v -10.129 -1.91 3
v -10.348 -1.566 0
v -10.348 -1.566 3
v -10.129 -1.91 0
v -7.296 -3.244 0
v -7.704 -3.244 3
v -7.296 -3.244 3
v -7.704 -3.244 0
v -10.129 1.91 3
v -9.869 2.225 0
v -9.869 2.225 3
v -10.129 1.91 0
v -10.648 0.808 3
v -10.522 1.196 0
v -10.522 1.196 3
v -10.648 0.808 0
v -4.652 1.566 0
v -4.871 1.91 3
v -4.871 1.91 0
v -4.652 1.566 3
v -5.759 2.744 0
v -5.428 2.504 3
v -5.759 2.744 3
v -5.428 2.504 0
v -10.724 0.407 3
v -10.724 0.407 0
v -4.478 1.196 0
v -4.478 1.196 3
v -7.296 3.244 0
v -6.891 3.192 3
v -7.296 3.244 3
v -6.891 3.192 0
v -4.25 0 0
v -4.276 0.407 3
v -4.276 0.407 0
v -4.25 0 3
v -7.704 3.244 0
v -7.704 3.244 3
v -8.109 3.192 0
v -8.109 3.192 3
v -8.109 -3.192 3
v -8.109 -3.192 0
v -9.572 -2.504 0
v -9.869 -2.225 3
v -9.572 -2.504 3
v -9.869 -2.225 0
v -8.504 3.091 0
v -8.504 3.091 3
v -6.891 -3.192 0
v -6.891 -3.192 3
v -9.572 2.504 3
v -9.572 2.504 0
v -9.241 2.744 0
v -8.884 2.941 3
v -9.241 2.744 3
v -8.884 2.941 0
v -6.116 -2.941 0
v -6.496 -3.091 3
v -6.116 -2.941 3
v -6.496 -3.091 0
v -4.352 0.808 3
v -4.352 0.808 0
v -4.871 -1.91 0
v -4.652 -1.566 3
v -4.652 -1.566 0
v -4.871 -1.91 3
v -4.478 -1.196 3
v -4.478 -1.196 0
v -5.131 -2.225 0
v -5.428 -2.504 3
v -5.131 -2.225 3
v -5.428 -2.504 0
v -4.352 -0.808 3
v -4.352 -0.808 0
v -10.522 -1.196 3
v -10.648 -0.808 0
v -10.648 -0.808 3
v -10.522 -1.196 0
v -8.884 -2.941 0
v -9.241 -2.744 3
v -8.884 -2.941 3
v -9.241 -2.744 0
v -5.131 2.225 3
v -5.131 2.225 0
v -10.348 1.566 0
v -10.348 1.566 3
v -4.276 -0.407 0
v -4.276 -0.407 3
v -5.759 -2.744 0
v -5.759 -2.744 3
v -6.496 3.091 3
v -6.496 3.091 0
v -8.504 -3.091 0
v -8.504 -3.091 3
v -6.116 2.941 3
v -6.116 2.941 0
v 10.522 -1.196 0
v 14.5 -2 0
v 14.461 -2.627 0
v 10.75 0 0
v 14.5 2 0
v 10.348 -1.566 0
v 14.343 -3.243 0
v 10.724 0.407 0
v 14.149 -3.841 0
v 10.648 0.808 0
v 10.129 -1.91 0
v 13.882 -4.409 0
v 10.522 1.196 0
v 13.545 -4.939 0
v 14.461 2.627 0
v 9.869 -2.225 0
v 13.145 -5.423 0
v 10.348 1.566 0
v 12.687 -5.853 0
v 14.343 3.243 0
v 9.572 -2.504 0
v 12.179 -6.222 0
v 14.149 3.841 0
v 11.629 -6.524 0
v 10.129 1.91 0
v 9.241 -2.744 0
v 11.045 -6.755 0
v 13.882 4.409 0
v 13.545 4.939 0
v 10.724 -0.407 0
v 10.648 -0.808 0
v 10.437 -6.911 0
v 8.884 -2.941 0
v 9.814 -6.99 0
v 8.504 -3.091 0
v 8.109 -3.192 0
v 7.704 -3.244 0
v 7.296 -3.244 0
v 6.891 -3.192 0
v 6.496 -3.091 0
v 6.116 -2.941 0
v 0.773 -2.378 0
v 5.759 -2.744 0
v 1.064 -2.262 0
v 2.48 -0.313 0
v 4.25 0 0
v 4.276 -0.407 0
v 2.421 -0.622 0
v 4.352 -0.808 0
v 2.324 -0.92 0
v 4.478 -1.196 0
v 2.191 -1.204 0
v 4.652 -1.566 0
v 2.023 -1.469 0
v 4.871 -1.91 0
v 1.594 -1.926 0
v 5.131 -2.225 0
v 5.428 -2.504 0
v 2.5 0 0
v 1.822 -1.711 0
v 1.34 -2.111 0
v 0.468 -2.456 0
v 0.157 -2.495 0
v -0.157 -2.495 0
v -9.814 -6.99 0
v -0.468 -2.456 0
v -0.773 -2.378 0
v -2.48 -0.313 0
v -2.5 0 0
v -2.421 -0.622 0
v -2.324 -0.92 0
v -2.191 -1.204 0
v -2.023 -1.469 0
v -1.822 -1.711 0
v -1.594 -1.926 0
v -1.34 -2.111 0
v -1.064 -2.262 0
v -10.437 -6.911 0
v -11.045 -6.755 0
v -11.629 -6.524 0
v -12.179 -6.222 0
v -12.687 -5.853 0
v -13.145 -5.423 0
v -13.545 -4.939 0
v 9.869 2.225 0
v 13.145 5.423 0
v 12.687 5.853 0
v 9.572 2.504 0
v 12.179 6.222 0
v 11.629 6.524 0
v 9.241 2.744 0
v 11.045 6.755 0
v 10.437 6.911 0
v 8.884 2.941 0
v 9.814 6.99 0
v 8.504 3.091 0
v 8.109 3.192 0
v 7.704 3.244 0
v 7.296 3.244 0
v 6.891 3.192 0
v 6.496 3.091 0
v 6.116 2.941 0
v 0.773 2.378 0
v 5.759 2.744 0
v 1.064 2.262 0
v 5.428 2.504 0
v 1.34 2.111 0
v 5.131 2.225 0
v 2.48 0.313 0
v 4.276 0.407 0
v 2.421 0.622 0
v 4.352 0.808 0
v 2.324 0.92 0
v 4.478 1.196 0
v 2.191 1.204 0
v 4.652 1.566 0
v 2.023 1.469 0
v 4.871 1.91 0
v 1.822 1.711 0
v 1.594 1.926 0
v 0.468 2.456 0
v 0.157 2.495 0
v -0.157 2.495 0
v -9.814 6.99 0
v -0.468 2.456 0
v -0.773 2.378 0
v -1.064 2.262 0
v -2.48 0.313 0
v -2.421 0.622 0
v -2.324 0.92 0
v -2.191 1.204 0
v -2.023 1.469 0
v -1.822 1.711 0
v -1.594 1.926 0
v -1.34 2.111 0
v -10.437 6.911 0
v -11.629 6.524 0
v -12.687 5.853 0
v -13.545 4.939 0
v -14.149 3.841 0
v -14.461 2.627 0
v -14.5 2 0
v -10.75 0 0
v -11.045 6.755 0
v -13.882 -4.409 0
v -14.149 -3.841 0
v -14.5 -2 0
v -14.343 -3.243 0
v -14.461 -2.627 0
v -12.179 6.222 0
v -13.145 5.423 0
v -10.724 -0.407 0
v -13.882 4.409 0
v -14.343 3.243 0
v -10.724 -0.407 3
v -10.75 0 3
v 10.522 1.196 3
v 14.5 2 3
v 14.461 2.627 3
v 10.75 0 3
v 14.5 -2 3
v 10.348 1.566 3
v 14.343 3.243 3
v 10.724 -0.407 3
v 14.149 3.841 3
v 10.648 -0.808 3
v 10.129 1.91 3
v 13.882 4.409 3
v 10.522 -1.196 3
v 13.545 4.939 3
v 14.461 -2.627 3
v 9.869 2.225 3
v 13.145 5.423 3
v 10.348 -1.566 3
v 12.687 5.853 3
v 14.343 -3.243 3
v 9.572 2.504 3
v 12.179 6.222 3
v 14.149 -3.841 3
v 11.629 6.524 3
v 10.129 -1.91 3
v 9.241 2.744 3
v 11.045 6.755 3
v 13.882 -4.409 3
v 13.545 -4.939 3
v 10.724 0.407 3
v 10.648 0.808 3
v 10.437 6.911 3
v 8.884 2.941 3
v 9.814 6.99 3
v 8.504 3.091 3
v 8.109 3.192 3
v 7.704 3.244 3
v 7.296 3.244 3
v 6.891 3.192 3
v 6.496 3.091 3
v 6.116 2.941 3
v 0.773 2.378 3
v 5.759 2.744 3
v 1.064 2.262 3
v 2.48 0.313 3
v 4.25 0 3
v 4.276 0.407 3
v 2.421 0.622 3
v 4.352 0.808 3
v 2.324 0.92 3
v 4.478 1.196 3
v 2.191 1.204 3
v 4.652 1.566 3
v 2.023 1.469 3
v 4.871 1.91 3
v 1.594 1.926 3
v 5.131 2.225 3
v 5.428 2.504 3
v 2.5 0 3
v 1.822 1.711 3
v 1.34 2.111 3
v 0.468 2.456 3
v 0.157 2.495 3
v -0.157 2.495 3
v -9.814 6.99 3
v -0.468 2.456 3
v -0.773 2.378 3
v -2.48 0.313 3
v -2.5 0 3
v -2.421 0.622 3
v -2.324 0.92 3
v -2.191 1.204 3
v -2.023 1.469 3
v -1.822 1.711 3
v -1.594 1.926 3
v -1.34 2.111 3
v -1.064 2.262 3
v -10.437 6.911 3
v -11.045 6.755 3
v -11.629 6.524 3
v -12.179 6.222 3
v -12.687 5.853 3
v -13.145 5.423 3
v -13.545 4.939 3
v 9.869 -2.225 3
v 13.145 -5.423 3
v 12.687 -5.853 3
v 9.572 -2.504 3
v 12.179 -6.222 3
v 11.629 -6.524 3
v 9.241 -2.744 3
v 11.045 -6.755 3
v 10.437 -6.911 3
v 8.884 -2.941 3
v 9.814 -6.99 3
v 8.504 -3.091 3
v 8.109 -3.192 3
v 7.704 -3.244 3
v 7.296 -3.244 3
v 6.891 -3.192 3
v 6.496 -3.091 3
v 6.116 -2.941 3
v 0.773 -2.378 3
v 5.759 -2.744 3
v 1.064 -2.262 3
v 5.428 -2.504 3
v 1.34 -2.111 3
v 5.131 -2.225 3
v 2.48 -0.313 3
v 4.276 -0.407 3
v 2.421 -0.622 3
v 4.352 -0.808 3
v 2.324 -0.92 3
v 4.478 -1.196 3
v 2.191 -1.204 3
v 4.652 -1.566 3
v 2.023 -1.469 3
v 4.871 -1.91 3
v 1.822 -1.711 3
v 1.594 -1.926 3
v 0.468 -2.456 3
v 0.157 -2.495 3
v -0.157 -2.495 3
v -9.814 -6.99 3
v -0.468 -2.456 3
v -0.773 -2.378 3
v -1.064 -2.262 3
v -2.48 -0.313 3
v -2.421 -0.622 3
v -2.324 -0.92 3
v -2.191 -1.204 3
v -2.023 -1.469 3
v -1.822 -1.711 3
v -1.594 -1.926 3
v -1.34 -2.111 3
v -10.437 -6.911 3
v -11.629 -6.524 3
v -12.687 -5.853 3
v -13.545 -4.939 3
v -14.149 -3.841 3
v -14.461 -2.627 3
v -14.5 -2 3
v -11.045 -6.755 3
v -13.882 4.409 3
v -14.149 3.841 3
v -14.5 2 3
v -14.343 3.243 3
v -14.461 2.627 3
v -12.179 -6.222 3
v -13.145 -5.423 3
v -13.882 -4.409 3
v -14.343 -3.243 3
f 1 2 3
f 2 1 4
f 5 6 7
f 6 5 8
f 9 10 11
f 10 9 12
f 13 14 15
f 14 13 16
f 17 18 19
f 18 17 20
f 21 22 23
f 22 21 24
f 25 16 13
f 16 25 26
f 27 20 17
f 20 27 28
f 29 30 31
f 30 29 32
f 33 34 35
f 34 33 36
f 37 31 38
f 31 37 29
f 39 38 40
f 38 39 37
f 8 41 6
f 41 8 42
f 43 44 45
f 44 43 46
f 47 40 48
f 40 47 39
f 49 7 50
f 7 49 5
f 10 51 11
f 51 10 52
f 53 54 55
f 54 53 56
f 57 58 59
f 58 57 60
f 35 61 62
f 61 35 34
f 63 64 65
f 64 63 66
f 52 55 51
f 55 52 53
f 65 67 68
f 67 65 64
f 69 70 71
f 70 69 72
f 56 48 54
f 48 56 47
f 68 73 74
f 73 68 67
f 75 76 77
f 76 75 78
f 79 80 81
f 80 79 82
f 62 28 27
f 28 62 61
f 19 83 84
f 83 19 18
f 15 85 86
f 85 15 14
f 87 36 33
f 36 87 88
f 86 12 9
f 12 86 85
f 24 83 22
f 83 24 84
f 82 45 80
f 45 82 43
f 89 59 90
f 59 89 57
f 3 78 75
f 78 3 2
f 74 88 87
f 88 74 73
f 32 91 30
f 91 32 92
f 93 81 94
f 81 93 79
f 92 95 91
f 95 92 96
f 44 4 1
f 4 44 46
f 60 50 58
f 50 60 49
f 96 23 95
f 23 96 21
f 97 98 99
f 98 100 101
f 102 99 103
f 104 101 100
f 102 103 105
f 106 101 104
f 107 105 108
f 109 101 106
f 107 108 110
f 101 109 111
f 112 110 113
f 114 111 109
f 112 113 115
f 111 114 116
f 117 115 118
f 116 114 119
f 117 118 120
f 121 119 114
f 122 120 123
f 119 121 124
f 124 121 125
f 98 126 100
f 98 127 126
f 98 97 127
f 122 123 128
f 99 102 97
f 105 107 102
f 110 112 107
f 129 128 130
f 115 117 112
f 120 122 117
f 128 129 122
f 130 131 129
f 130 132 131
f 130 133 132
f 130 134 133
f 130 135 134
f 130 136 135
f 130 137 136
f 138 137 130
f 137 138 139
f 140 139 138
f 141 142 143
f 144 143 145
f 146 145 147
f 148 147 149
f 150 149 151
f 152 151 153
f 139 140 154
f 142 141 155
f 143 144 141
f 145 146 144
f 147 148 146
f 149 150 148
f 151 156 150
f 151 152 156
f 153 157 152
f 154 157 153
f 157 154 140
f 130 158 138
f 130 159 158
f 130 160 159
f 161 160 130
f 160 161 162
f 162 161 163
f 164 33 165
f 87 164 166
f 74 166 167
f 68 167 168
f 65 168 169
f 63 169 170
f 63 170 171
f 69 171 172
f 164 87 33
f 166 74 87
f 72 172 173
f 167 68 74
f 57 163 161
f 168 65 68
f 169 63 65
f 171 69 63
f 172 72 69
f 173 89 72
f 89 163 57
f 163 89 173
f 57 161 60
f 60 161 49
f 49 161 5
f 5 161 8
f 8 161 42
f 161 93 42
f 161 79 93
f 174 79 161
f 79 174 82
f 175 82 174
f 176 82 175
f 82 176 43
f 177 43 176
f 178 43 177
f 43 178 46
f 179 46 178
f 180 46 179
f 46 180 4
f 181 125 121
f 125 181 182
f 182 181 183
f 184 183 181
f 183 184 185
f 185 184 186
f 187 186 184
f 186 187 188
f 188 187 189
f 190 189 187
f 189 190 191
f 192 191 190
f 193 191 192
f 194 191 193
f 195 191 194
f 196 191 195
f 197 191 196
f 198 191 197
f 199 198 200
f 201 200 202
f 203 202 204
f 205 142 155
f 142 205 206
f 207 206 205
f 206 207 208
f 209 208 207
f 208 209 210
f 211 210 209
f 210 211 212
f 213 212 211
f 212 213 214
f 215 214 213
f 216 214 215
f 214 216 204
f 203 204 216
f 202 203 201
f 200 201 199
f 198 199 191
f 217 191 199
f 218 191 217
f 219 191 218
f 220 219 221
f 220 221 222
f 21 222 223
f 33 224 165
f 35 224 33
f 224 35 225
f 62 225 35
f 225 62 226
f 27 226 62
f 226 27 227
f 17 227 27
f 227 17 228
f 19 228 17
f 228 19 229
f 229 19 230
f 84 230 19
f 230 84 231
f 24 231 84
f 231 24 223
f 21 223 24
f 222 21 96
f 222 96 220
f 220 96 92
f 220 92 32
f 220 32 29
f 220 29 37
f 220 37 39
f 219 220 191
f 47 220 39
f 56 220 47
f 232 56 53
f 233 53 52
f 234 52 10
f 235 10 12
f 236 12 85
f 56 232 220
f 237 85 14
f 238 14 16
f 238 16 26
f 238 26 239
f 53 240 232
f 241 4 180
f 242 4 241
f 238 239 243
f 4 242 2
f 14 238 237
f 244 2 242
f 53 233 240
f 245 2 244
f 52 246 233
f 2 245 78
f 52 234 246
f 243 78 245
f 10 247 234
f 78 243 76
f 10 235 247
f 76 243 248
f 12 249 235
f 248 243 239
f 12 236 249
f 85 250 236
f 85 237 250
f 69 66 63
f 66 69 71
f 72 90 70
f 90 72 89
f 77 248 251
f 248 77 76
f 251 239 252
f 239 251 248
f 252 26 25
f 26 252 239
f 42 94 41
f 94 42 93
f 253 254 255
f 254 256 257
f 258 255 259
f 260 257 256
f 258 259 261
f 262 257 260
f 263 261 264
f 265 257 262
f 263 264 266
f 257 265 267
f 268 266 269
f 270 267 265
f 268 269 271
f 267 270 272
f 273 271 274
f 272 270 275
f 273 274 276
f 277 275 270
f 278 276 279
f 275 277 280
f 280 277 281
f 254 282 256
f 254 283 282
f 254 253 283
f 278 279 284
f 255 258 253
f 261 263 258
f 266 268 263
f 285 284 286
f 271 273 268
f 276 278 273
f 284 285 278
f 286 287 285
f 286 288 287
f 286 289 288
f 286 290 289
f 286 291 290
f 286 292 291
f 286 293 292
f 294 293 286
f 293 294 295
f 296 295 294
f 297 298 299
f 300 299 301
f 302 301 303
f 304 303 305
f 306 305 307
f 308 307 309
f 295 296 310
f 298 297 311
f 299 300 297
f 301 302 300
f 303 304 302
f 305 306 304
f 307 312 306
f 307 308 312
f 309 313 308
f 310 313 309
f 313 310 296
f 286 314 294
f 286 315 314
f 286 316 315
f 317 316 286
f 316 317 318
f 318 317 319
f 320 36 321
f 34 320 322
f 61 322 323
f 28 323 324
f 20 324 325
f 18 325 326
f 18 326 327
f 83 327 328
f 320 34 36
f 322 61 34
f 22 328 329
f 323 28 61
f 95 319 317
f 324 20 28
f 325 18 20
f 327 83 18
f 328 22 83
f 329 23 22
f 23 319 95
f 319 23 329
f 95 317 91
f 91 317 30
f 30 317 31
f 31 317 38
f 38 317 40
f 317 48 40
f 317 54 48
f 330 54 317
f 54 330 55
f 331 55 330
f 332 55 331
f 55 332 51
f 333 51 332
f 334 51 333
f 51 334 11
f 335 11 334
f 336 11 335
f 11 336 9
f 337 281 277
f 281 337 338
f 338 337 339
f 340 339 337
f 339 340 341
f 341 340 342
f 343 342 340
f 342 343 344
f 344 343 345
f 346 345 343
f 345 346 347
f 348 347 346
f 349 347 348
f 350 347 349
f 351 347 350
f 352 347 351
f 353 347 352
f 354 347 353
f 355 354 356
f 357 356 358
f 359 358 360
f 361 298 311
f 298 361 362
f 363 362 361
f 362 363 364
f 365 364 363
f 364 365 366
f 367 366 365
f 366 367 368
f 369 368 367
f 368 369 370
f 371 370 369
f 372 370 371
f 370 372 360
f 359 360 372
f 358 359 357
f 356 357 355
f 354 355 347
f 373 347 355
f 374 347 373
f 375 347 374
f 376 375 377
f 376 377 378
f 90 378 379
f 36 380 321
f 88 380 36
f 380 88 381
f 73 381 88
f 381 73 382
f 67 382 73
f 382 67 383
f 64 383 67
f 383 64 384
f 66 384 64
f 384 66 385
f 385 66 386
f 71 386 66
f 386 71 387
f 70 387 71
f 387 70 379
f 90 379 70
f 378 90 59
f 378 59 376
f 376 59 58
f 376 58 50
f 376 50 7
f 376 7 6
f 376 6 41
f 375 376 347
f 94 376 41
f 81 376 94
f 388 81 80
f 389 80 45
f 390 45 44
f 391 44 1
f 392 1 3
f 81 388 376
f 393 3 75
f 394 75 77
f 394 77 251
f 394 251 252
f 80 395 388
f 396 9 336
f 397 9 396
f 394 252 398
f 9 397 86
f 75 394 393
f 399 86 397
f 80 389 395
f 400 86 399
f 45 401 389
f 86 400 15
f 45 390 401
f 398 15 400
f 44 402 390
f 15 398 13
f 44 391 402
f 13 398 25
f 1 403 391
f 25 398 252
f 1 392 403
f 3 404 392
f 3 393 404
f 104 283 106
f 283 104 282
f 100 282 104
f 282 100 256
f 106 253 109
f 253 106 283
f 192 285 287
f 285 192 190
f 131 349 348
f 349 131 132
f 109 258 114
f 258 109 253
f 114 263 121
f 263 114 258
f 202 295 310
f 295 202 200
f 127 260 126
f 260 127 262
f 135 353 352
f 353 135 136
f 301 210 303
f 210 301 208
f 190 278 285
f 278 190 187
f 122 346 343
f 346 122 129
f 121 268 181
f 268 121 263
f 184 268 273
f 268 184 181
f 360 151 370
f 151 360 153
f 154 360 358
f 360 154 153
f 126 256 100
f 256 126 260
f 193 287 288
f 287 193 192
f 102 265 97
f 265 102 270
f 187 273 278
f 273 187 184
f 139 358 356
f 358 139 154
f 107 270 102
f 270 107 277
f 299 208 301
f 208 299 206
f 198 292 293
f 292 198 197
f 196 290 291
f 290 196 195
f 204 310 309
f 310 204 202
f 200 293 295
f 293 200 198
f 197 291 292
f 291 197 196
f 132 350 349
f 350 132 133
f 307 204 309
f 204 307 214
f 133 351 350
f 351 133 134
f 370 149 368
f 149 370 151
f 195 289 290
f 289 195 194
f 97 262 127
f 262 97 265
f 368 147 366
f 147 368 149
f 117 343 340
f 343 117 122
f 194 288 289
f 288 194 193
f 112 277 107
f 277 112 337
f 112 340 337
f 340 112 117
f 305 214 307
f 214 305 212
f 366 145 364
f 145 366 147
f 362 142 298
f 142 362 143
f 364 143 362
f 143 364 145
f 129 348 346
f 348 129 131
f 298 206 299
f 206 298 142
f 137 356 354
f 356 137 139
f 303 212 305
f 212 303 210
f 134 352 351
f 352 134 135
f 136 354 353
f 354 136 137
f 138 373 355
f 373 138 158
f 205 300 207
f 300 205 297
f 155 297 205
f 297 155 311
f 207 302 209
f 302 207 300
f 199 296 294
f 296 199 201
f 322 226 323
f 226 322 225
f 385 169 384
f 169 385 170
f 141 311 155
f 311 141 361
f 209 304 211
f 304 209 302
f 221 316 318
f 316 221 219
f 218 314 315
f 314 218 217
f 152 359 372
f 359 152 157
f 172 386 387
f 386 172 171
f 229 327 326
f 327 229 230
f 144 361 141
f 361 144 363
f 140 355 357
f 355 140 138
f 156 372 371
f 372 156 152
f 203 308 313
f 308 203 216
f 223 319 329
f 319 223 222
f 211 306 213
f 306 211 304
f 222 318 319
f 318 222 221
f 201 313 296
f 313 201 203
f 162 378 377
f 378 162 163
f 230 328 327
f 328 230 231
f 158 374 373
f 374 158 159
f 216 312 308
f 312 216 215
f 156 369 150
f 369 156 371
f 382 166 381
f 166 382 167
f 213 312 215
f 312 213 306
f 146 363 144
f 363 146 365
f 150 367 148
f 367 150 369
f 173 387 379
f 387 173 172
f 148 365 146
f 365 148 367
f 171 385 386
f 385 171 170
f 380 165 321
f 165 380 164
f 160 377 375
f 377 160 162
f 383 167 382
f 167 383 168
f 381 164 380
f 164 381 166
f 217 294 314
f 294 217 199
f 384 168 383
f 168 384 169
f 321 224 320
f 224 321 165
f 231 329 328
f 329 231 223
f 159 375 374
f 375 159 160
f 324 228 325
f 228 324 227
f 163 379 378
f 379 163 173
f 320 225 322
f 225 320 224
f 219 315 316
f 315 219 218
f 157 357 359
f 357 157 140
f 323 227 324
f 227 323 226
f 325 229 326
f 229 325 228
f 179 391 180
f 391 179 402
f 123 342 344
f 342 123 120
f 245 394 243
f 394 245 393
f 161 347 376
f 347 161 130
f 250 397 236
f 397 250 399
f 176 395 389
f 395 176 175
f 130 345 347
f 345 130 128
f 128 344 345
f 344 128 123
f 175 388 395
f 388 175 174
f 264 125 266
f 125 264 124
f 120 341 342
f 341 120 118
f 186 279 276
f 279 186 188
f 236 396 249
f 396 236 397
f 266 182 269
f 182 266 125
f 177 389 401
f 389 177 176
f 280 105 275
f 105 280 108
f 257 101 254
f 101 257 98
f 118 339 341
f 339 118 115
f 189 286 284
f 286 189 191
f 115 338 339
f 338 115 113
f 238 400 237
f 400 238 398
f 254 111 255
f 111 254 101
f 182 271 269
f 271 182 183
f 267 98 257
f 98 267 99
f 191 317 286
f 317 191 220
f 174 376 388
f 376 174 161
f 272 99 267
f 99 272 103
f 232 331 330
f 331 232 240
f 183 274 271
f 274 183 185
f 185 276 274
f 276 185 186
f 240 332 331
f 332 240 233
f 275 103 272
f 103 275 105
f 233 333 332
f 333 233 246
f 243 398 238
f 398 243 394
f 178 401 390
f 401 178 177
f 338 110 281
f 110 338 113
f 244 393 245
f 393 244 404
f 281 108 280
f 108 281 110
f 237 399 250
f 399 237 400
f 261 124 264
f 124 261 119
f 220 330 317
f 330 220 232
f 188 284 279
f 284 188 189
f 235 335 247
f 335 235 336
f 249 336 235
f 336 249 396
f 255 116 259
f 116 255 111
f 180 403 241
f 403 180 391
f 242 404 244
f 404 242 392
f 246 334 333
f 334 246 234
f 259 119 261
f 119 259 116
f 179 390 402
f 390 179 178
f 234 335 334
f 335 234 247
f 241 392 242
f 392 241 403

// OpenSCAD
$fn = 50;

difference() {
	union() {
		hull() {
			translate(v = [-9.5, 2.0, 0]) {
				cylinder(h = 3, r = 5);
			}
			translate(v = [9.5, 2.0, 0]) {
				cylinder(h = 3, r = 5);
			}
			translate(v = [-9.5, -2.0, 0]) {
				cylinder(h = 3, r = 5);
			}
			translate(v = [9.5, -2.0, 0]) {
				cylinder(h = 3, r = 5);
			}
		}
	}
	union() {
		translate(v = [-7.5, 0.0, 0]) {
			cylinder(h = 3, r = 3.25);
		}
		translate(v = [7.5, 0.0, 0]) {
			cylinder(h = 3, r = 3.25);
		}
		cylinder(h = 3, r = 2.5);
	}
}
